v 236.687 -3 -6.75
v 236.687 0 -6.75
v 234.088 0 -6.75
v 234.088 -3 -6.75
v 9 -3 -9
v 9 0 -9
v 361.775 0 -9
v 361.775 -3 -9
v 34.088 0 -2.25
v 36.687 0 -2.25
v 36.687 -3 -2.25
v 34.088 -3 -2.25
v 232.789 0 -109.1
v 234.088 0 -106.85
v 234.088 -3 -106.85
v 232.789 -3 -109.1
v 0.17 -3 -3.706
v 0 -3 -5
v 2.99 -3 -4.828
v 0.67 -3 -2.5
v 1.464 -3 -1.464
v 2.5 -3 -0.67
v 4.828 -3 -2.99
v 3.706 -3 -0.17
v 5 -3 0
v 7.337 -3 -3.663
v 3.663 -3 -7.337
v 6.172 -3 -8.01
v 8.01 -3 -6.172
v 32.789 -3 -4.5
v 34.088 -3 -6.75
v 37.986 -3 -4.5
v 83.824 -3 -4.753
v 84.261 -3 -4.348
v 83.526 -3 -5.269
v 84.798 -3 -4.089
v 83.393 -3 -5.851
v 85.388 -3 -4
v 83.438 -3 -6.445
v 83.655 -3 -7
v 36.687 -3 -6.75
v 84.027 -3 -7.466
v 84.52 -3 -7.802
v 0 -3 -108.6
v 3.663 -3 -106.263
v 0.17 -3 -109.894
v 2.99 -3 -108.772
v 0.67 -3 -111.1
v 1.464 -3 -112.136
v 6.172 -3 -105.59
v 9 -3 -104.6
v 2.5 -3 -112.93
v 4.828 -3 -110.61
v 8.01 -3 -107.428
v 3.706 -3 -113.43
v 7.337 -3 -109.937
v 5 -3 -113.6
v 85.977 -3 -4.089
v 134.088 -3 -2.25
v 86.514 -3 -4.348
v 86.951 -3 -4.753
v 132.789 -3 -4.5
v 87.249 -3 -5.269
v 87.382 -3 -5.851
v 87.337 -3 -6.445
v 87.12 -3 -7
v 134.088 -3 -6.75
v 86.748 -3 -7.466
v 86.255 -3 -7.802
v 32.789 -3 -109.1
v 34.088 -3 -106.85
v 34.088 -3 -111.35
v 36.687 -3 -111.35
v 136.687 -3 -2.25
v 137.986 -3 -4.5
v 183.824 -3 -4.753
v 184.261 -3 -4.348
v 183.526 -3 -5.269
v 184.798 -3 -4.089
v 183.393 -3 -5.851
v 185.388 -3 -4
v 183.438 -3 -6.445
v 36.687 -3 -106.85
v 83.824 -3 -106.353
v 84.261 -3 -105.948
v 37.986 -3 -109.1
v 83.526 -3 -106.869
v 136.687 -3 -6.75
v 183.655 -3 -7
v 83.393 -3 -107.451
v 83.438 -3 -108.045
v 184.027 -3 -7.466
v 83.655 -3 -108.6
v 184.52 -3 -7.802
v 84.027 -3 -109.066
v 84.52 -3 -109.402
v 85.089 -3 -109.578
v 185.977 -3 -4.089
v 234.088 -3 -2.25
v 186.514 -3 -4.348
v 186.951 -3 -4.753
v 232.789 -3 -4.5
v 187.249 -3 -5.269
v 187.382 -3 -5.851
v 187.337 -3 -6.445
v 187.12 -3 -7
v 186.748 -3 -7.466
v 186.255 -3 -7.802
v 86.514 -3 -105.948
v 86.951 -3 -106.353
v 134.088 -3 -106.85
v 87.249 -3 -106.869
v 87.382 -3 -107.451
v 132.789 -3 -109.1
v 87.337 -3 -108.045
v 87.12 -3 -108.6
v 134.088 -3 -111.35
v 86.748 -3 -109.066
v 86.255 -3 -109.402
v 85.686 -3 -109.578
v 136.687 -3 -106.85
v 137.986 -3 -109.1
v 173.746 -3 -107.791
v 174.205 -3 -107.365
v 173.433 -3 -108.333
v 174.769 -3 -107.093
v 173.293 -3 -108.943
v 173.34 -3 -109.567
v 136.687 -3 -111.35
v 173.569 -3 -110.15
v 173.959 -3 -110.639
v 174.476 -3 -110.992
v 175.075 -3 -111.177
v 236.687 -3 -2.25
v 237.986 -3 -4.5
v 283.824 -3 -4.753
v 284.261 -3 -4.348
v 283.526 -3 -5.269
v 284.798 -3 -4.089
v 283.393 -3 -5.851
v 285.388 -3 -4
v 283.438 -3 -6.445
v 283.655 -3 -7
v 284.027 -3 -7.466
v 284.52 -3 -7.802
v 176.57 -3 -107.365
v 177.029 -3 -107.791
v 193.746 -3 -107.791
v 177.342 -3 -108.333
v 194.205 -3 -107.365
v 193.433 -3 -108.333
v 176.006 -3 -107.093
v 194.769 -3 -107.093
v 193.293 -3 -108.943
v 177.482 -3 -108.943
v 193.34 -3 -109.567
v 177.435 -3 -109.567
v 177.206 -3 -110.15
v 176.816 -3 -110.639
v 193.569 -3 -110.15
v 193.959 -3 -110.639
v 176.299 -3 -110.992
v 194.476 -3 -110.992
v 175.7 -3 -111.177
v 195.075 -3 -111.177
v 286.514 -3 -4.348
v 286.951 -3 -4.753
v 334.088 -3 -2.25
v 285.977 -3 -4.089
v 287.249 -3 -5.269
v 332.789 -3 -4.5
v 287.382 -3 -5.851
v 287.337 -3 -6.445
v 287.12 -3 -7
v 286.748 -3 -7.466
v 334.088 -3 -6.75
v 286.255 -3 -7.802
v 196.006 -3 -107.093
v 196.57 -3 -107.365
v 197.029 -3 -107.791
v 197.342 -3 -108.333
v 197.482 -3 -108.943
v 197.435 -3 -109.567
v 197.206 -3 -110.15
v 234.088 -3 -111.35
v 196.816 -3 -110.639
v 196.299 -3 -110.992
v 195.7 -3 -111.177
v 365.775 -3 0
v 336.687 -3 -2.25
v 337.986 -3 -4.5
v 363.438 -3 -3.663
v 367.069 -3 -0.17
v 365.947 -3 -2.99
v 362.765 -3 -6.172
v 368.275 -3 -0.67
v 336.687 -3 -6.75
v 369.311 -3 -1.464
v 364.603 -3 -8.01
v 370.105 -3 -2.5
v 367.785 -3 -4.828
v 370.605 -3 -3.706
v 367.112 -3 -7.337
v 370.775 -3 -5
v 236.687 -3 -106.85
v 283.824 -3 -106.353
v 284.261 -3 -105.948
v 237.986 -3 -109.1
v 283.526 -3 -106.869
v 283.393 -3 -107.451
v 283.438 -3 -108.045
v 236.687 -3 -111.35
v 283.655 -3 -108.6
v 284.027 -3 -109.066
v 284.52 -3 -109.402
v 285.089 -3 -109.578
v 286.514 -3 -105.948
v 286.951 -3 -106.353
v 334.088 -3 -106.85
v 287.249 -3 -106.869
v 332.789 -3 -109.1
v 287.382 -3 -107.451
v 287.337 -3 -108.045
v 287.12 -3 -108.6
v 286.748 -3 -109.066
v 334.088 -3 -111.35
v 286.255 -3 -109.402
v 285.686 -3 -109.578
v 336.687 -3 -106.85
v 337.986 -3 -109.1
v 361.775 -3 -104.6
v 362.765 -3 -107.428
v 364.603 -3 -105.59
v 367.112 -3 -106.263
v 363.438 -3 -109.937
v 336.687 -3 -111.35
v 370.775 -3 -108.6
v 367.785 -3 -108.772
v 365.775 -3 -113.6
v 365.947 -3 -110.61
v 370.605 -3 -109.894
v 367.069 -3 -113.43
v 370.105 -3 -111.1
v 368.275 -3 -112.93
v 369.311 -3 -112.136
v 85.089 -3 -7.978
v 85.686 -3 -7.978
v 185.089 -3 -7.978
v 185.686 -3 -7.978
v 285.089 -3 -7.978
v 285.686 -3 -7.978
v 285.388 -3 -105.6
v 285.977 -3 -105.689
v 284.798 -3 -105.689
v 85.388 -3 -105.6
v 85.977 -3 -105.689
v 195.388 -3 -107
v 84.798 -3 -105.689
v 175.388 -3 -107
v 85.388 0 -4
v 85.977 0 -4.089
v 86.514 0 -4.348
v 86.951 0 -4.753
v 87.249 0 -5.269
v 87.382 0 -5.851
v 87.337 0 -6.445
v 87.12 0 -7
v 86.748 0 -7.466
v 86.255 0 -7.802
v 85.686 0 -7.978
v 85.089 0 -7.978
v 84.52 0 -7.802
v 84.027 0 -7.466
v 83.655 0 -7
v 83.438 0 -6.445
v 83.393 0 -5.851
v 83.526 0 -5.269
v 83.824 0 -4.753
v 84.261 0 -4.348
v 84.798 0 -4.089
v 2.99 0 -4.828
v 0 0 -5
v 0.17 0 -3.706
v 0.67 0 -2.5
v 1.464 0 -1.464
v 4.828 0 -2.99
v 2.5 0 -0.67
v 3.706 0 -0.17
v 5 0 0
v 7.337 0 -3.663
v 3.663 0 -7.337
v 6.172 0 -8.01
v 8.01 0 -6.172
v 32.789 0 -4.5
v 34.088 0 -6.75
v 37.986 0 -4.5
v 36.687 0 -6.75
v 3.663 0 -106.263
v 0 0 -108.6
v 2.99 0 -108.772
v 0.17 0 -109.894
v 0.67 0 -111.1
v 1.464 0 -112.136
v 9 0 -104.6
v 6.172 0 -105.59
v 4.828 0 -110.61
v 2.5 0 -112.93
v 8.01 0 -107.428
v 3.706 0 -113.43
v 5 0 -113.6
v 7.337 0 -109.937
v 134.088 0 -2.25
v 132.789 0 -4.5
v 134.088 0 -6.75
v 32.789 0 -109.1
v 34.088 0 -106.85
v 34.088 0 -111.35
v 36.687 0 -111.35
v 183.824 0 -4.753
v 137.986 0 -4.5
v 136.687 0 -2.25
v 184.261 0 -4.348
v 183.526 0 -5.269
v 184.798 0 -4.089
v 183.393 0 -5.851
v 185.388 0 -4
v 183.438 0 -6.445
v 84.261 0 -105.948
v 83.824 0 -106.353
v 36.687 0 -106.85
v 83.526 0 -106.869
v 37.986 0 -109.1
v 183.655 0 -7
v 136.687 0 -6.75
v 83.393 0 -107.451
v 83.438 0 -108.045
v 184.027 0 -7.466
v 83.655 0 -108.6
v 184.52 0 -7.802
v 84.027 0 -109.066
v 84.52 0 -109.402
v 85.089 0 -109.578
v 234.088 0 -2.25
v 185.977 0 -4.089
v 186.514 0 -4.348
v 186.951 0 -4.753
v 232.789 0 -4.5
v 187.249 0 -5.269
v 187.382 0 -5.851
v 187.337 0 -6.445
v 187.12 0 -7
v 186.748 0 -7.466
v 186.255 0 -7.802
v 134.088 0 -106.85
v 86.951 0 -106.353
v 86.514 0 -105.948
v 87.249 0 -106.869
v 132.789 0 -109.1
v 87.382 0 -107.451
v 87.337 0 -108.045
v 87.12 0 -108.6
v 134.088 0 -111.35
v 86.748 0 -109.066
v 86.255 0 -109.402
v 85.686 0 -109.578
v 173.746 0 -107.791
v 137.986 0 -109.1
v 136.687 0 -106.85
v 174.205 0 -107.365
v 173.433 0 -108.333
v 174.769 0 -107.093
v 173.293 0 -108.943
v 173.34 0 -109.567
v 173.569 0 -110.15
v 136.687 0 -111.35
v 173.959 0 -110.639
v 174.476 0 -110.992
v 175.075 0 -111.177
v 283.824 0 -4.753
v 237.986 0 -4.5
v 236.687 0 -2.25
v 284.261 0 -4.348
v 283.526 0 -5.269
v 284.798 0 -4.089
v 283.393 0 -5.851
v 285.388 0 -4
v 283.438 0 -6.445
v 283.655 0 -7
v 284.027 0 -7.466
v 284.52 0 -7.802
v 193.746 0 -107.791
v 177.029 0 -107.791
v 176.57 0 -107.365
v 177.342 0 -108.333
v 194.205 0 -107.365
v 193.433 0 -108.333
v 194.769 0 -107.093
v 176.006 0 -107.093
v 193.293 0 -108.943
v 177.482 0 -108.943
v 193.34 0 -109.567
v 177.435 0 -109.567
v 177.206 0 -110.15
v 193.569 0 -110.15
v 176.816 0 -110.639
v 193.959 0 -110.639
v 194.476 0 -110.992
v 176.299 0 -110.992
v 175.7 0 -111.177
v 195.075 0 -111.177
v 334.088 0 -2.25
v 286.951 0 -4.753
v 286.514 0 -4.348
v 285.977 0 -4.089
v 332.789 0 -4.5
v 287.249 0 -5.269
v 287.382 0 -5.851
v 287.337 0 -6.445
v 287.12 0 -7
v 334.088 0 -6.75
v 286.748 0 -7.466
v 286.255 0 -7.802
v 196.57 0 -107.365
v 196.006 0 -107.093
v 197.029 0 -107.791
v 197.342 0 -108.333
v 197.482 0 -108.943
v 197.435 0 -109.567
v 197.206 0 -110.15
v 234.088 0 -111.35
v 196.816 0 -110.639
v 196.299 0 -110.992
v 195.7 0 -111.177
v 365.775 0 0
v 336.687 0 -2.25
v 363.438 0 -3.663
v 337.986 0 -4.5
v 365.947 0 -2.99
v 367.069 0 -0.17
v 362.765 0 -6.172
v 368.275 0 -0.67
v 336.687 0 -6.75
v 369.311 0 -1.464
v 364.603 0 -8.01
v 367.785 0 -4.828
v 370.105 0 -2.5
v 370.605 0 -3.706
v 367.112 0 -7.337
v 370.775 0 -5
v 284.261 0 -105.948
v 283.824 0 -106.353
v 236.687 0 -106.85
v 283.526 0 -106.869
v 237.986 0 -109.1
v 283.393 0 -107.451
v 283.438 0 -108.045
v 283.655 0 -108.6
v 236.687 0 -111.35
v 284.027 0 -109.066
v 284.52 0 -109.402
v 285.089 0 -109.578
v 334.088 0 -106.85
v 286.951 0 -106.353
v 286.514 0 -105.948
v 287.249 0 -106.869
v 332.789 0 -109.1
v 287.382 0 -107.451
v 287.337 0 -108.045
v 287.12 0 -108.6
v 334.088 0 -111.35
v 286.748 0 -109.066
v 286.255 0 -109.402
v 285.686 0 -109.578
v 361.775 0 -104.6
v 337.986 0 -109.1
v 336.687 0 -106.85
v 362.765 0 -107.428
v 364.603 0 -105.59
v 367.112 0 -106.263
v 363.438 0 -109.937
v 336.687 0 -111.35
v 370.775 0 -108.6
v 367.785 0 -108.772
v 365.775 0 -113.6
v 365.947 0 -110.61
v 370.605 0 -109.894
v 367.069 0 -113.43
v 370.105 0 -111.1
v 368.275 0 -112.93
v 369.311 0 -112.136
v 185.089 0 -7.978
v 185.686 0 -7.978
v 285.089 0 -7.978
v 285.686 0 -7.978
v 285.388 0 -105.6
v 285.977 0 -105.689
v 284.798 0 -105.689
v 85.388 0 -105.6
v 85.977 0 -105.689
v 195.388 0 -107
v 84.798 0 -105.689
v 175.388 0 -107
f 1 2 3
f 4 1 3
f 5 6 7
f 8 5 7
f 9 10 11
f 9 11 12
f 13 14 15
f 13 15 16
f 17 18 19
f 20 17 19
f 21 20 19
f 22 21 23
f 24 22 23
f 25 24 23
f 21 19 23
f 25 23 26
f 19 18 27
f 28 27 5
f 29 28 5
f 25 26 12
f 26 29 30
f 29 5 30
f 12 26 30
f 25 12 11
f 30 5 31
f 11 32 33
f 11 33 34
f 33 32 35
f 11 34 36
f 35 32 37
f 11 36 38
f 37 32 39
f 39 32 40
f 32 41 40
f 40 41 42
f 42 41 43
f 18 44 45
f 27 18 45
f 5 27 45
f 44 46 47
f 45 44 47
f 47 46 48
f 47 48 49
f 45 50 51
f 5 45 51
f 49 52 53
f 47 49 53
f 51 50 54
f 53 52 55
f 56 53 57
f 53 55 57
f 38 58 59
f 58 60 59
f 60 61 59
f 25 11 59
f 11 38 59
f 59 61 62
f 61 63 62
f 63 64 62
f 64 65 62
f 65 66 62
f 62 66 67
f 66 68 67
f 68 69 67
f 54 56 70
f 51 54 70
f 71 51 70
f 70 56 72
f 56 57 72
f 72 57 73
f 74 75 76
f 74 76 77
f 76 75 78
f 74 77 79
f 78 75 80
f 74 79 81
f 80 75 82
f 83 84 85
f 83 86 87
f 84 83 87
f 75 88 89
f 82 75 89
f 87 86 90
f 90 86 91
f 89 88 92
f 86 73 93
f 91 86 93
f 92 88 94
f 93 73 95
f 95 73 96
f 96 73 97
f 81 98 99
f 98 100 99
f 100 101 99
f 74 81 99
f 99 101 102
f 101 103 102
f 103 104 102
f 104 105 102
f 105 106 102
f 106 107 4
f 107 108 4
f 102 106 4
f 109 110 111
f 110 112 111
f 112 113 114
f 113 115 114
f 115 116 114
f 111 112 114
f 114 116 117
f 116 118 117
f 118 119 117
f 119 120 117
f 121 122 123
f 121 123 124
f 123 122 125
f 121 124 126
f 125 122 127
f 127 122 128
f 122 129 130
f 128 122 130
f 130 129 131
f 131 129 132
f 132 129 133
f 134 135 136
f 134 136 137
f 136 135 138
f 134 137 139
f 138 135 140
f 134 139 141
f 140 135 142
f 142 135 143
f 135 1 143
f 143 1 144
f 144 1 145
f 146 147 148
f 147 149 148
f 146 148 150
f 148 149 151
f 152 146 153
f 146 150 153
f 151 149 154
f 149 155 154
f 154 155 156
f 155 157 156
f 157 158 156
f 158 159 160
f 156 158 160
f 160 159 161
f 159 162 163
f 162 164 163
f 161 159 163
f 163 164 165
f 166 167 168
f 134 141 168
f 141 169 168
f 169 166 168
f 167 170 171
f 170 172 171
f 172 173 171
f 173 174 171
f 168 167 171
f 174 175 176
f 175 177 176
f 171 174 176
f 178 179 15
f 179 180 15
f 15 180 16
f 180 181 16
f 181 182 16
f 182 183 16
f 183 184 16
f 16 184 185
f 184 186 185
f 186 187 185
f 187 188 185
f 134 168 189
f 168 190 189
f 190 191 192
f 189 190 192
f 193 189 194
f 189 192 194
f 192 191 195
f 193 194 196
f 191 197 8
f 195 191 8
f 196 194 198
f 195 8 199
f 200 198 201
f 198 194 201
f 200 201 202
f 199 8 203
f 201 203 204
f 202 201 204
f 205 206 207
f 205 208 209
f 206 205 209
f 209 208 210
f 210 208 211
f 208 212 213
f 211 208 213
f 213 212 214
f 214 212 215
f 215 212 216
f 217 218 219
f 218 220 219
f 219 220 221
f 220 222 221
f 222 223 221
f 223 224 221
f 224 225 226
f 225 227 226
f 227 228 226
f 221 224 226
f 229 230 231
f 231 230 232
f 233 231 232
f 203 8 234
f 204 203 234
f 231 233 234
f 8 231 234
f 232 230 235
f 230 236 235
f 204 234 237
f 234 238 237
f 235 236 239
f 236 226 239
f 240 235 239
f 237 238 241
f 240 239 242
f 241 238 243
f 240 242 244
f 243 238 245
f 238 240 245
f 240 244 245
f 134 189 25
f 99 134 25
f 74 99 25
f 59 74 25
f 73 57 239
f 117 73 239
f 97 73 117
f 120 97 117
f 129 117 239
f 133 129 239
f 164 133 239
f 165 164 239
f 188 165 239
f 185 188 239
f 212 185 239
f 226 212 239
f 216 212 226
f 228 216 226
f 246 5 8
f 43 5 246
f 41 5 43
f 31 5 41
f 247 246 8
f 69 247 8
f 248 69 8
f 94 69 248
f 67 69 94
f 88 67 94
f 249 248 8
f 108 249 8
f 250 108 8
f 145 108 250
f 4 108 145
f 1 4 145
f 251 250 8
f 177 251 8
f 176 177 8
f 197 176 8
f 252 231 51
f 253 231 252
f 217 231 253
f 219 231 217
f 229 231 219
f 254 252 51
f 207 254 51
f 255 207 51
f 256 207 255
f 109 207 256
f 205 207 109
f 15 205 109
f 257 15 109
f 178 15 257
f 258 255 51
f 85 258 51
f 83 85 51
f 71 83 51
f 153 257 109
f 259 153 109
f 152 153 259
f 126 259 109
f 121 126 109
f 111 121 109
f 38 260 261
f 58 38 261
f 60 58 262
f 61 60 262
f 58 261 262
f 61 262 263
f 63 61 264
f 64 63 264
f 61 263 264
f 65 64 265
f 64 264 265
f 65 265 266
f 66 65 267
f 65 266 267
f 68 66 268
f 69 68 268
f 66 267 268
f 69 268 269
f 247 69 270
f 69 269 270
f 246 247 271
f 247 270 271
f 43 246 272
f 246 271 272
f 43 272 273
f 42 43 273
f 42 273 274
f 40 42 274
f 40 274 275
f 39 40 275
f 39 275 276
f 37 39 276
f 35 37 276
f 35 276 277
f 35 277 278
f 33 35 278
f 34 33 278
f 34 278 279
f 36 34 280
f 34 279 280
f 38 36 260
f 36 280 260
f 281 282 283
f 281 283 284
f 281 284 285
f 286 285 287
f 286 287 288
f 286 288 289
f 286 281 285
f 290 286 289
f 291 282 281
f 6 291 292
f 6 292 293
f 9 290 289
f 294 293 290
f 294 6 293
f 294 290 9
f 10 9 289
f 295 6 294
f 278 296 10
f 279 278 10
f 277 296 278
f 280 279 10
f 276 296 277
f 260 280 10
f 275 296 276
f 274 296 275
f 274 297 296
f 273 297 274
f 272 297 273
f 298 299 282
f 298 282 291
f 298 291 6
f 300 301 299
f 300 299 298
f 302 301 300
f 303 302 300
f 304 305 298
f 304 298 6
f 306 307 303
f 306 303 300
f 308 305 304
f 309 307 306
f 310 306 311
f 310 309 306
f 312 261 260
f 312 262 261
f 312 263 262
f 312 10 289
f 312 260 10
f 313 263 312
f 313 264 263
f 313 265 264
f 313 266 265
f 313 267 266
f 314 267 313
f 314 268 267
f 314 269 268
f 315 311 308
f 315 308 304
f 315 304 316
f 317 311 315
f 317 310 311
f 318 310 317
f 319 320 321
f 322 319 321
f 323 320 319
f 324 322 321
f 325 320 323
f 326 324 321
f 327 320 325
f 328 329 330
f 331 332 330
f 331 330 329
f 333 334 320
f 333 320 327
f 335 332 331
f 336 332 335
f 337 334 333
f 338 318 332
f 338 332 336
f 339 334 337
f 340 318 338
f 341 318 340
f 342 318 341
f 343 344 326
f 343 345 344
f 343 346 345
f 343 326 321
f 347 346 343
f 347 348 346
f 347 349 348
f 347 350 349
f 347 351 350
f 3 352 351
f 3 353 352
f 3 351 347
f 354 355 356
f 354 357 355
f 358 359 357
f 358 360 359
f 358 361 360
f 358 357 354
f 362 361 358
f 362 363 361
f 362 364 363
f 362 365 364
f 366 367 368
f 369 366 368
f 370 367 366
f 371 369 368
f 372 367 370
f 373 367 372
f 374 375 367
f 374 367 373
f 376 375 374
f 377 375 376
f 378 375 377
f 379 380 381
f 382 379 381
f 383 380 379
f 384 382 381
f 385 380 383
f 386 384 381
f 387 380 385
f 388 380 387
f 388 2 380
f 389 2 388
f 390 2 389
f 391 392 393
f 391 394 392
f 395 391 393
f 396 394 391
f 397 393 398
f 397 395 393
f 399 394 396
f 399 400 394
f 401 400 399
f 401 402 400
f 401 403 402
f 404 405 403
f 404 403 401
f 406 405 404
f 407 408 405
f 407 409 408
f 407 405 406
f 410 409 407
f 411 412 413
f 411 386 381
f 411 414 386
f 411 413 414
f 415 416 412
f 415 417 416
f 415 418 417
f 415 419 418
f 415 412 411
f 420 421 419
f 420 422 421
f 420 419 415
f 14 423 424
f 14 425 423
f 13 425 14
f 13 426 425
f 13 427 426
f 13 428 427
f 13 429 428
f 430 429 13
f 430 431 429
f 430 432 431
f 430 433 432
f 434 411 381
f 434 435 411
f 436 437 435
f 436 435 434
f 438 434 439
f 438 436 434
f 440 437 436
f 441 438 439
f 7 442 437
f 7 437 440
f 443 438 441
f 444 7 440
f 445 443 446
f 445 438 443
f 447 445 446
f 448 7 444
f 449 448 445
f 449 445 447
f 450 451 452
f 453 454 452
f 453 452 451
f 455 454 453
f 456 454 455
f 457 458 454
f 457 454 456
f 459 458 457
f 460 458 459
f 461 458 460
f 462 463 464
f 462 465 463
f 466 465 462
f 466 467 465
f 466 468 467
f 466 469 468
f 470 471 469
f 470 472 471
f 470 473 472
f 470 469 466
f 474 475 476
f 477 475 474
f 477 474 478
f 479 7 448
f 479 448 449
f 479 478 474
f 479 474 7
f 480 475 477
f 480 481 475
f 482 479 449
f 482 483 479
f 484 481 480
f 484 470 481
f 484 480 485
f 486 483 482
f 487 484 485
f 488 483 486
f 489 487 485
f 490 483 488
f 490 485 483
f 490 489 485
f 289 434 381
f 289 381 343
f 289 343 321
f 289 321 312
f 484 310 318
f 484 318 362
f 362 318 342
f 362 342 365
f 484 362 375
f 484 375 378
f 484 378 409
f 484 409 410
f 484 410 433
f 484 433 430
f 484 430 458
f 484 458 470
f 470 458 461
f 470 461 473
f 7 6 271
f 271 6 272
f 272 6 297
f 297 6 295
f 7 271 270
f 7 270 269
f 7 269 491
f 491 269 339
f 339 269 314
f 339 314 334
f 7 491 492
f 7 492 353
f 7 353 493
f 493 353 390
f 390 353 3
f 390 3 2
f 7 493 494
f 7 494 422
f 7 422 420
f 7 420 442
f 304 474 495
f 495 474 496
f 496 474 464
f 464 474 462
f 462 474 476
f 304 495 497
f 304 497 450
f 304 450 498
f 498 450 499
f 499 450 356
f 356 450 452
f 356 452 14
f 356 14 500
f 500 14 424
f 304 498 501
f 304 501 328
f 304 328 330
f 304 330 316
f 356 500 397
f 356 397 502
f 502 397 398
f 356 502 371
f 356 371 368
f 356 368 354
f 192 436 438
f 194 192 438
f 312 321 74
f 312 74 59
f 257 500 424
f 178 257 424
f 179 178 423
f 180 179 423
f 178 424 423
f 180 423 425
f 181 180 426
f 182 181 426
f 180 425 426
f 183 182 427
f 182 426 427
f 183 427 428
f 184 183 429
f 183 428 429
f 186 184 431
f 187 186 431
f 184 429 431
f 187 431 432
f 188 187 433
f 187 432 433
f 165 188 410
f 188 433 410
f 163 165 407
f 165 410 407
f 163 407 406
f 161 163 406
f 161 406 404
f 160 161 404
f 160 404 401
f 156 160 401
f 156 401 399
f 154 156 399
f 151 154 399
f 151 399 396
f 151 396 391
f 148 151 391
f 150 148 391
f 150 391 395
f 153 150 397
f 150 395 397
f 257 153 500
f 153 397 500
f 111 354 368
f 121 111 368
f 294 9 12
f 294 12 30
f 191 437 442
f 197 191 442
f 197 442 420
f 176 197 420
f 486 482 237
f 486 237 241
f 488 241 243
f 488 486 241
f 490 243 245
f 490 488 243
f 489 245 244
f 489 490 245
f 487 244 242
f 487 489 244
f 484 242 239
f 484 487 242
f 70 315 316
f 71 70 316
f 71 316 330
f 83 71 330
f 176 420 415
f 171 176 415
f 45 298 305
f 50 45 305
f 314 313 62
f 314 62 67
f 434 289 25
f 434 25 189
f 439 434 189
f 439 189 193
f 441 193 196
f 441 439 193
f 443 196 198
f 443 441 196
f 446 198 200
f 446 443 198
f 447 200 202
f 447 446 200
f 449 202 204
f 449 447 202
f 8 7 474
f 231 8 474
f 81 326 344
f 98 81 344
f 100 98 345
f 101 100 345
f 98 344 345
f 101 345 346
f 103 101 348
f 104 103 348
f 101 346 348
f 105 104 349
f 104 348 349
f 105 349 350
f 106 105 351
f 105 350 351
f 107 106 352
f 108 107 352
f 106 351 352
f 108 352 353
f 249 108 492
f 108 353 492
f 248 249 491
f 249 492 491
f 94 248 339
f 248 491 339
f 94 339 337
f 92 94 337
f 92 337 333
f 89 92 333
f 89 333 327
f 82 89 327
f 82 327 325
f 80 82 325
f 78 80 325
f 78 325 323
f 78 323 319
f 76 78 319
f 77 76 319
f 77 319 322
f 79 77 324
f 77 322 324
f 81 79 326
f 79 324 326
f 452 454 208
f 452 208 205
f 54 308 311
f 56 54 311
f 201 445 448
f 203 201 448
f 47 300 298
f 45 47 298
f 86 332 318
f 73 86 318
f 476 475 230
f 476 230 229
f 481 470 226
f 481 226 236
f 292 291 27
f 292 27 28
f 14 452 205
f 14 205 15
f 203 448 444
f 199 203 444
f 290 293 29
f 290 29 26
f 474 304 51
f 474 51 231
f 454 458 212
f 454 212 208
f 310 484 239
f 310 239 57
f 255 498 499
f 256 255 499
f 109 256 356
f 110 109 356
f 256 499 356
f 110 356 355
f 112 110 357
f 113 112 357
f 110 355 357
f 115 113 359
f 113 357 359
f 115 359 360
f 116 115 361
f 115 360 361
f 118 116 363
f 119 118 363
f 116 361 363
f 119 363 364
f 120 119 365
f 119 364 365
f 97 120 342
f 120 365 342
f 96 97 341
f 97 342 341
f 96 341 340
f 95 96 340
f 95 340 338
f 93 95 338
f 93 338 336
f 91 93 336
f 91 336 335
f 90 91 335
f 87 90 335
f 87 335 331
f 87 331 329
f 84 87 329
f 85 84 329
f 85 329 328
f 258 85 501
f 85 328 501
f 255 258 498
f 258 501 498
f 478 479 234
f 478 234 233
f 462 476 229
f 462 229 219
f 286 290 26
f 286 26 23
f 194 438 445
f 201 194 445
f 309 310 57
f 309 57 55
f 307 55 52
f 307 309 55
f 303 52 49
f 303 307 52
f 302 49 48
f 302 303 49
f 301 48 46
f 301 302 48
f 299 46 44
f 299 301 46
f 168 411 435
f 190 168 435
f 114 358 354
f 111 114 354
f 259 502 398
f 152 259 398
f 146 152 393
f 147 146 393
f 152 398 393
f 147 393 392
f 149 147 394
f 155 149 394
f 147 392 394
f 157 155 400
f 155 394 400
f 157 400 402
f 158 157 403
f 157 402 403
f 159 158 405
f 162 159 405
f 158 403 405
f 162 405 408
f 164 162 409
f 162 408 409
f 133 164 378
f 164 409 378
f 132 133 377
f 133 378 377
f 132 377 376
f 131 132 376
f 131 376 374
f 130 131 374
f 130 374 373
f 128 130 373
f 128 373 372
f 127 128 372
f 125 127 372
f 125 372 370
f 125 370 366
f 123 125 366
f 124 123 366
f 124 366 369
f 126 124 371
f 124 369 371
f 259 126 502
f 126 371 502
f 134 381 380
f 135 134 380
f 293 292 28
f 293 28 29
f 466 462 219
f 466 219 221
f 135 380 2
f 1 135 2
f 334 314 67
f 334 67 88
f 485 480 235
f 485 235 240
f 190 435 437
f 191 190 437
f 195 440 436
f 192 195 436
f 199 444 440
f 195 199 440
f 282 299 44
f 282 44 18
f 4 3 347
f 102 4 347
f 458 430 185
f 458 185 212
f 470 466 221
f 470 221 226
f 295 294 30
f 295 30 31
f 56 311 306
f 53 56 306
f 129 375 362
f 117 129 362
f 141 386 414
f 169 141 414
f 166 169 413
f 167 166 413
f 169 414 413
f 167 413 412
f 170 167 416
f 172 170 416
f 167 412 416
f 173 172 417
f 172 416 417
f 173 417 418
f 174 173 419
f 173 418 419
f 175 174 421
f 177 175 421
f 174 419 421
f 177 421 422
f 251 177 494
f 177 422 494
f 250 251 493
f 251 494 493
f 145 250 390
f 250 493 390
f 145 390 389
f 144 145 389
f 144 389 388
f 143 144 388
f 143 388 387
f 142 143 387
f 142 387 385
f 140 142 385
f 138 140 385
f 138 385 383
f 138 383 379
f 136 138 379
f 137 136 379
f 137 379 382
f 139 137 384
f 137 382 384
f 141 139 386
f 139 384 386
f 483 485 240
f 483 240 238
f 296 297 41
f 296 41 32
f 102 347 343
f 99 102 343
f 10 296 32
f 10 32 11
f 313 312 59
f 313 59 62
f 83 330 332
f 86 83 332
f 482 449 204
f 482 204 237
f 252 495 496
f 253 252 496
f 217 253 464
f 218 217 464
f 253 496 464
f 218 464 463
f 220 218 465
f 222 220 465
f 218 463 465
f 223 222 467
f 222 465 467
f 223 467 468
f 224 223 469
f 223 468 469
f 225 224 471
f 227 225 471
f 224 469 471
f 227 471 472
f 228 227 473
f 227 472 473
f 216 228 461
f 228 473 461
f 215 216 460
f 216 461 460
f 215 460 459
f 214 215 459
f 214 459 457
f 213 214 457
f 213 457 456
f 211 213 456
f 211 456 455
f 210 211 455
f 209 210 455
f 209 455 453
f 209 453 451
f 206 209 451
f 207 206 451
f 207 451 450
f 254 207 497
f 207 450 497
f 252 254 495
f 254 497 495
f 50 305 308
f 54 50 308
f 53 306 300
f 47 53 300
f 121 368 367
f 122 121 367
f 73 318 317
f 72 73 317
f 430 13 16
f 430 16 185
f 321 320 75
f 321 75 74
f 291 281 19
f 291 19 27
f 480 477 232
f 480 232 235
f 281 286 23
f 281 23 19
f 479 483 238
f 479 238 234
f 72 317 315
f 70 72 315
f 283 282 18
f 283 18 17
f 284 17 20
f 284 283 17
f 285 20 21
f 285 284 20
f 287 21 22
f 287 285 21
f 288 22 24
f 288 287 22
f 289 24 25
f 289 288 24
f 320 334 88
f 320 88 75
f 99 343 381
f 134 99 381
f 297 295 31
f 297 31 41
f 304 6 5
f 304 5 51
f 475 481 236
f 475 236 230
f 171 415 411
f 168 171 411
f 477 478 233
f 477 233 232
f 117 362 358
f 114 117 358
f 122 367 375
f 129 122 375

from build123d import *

# Parameters (mm, degrees)
SKETCH1_R           = 2
SKETCH1_R_2         = 2.1
SKETCH1_W           = 352.775
SKETCH1_H           = 95.6
BOSS_EXTRUDE1_DEPTH = 3


with BuildPart() as part:
    # Sketch1 → Boss-Extrude1 (new body)
    with BuildSketch(Plane(origin=(0, 0, 0), x_dir=(1, 0, 0), z_dir=(0, 1, 0))):
        with BuildLine():
            Line((4.973e-06, 108.600001742), (4.973e-06, 5.000001742))
            ThreePointArc((4.973e-06, 5.000001742), (1.464471067, 1.464467836), (5.000004973, 1.742e-06))
            Line((5.000004973, 1.742e-06), (365.775004973, 1.742e-06))
            ThreePointArc((365.775004973, 1.742e-06), (369.310538879, 1.464467836), (370.775004973, 5.000001742))
            Line((370.775004973, 5.000001742), (370.775004973, 108.600001742))
            ThreePointArc((370.775004973, 108.600001742), (369.310538879, 112.135535647), (365.775004973, 113.600001742))
            Line((365.775004973, 113.600001742), (5.000004973, 113.600001742))
            ThreePointArc((5.000004973, 113.600001742), (1.464471067, 112.135535647), (4.973e-06, 108.600001742))
        make_face()
        with Locations(Location((85.387504973, 107.600001742, 0), (0, 0, 270))):
            Circle(SKETCH1_R, mode=Mode.SUBTRACT)
        with Locations(Location((285.387504973, 107.600001742, 0), (0, 0, 270))):
            Circle(SKETCH1_R, mode=Mode.SUBTRACT)
        with Locations(Location((85.387504973, 6.000001741, 0), (0, 0, 270))):
            Circle(SKETCH1_R, mode=Mode.SUBTRACT)
        with Locations(Location((185.387504973, 6.000001741, 0), (0, 0, 270))):
            Circle(SKETCH1_R, mode=Mode.SUBTRACT)
        with Locations(Location((285.387504973, 6.000001741, 0), (0, 0, 270))):
            Circle(SKETCH1_R, mode=Mode.SUBTRACT)
        with Locations(Location((175.387504973, 109.100001742, 0), (0, 0, 270))):
            Circle(SKETCH1_R_2, mode=Mode.SUBTRACT)
        with Locations(Location((195.387504973, 109.100001742, 0), (0, 0, 270))):
            Circle(SKETCH1_R_2, mode=Mode.SUBTRACT)
        with Locations((185.387504973, 56.800001742)):
            Rectangle(SKETCH1_W, SKETCH1_H, mode=Mode.SUBTRACT)
        Polygon((234.088466868, 111.350001742), (236.686543079, 111.350001742), (237.985581185, 109.100001742), (236.686543079, 106.850001742), (234.088466868, 106.850001742), (232.789428762, 109.100001742), align=None, mode=Mode.SUBTRACT)
        Polygon((334.088466868, 111.350001742), (336.686543079, 111.350001742), (337.985581185, 109.100001742), (336.686543079, 106.850001742), (334.088466868, 106.850001742), (332.789428762, 109.100001742), align=None, mode=Mode.SUBTRACT)
        Polygon((365.947436577, 110.609550653), (367.784553885, 108.772433346), (367.11212228, 106.262884434), (364.602573369, 105.59045283), (362.765456062, 107.427570137), (363.437887666, 109.937119049), align=None, mode=Mode.SUBTRACT)
        Polygon((136.686543079, 111.350001742), (134.088466868, 111.350001742), (132.789428762, 109.100001742), (134.088466868, 106.850001742), (136.686543079, 106.850001742), (137.985581185, 109.100001742), align=None, mode=Mode.SUBTRACT)
        Polygon((36.686543079, 111.350001742), (34.088466868, 111.350001742), (32.789428762, 109.100001742), (34.088466868, 106.850001742), (36.686543079, 106.850001742), (37.985581185, 109.100001742), align=None, mode=Mode.SUBTRACT)
        Polygon((4.827573369, 110.609550653), (2.990456062, 108.772433346), (3.662887666, 106.262884434), (6.172436577, 105.59045283), (8.009553885, 107.427570137), (7.33712228, 109.937119049), align=None, mode=Mode.SUBTRACT)
        Polygon((234.088466868, 2.250001742), (236.686543079, 2.250001742), (237.985581185, 4.500001742), (236.686543079, 6.750001742), (234.088466868, 6.750001742), (232.789428762, 4.500001742), align=None, mode=Mode.SUBTRACT)
        Polygon((334.088466868, 2.250001742), (336.686543079, 2.250001742), (337.985581185, 4.500001742), (336.686543079, 6.750001742), (334.088466868, 6.750001742), (332.789428762, 4.500001742), align=None, mode=Mode.SUBTRACT)
        Polygon((365.947436577, 2.99045283), (367.784553885, 4.827570137), (367.11212228, 7.337119049), (364.602573369, 8.009550653), (362.765456062, 6.172433346), (363.437887666, 3.662884434), align=None, mode=Mode.SUBTRACT)
        Polygon((136.686543079, 2.250001742), (134.088466868, 2.250001742), (132.789428762, 4.500001742), (134.088466868, 6.750001742), (136.686543079, 6.750001742), (137.985581185, 4.500001742), align=None, mode=Mode.SUBTRACT)
        Polygon((36.686543079, 2.250001742), (34.088466868, 2.250001742), (32.789428762, 4.500001742), (34.088466868, 6.750001742), (36.686543079, 6.750001742), (37.985581185, 4.500001742), align=None, mode=Mode.SUBTRACT)
        Polygon((4.827573369, 2.99045283), (2.990456062, 4.827570137), (3.662887666, 7.337119049), (6.172436577, 8.009550653), (8.009553885, 6.172433346), (7.33712228, 3.662884434), align=None, mode=Mode.SUBTRACT)
    extrude(amount=-BOSS_EXTRUDE1_DEPTH)


solid = part.part
